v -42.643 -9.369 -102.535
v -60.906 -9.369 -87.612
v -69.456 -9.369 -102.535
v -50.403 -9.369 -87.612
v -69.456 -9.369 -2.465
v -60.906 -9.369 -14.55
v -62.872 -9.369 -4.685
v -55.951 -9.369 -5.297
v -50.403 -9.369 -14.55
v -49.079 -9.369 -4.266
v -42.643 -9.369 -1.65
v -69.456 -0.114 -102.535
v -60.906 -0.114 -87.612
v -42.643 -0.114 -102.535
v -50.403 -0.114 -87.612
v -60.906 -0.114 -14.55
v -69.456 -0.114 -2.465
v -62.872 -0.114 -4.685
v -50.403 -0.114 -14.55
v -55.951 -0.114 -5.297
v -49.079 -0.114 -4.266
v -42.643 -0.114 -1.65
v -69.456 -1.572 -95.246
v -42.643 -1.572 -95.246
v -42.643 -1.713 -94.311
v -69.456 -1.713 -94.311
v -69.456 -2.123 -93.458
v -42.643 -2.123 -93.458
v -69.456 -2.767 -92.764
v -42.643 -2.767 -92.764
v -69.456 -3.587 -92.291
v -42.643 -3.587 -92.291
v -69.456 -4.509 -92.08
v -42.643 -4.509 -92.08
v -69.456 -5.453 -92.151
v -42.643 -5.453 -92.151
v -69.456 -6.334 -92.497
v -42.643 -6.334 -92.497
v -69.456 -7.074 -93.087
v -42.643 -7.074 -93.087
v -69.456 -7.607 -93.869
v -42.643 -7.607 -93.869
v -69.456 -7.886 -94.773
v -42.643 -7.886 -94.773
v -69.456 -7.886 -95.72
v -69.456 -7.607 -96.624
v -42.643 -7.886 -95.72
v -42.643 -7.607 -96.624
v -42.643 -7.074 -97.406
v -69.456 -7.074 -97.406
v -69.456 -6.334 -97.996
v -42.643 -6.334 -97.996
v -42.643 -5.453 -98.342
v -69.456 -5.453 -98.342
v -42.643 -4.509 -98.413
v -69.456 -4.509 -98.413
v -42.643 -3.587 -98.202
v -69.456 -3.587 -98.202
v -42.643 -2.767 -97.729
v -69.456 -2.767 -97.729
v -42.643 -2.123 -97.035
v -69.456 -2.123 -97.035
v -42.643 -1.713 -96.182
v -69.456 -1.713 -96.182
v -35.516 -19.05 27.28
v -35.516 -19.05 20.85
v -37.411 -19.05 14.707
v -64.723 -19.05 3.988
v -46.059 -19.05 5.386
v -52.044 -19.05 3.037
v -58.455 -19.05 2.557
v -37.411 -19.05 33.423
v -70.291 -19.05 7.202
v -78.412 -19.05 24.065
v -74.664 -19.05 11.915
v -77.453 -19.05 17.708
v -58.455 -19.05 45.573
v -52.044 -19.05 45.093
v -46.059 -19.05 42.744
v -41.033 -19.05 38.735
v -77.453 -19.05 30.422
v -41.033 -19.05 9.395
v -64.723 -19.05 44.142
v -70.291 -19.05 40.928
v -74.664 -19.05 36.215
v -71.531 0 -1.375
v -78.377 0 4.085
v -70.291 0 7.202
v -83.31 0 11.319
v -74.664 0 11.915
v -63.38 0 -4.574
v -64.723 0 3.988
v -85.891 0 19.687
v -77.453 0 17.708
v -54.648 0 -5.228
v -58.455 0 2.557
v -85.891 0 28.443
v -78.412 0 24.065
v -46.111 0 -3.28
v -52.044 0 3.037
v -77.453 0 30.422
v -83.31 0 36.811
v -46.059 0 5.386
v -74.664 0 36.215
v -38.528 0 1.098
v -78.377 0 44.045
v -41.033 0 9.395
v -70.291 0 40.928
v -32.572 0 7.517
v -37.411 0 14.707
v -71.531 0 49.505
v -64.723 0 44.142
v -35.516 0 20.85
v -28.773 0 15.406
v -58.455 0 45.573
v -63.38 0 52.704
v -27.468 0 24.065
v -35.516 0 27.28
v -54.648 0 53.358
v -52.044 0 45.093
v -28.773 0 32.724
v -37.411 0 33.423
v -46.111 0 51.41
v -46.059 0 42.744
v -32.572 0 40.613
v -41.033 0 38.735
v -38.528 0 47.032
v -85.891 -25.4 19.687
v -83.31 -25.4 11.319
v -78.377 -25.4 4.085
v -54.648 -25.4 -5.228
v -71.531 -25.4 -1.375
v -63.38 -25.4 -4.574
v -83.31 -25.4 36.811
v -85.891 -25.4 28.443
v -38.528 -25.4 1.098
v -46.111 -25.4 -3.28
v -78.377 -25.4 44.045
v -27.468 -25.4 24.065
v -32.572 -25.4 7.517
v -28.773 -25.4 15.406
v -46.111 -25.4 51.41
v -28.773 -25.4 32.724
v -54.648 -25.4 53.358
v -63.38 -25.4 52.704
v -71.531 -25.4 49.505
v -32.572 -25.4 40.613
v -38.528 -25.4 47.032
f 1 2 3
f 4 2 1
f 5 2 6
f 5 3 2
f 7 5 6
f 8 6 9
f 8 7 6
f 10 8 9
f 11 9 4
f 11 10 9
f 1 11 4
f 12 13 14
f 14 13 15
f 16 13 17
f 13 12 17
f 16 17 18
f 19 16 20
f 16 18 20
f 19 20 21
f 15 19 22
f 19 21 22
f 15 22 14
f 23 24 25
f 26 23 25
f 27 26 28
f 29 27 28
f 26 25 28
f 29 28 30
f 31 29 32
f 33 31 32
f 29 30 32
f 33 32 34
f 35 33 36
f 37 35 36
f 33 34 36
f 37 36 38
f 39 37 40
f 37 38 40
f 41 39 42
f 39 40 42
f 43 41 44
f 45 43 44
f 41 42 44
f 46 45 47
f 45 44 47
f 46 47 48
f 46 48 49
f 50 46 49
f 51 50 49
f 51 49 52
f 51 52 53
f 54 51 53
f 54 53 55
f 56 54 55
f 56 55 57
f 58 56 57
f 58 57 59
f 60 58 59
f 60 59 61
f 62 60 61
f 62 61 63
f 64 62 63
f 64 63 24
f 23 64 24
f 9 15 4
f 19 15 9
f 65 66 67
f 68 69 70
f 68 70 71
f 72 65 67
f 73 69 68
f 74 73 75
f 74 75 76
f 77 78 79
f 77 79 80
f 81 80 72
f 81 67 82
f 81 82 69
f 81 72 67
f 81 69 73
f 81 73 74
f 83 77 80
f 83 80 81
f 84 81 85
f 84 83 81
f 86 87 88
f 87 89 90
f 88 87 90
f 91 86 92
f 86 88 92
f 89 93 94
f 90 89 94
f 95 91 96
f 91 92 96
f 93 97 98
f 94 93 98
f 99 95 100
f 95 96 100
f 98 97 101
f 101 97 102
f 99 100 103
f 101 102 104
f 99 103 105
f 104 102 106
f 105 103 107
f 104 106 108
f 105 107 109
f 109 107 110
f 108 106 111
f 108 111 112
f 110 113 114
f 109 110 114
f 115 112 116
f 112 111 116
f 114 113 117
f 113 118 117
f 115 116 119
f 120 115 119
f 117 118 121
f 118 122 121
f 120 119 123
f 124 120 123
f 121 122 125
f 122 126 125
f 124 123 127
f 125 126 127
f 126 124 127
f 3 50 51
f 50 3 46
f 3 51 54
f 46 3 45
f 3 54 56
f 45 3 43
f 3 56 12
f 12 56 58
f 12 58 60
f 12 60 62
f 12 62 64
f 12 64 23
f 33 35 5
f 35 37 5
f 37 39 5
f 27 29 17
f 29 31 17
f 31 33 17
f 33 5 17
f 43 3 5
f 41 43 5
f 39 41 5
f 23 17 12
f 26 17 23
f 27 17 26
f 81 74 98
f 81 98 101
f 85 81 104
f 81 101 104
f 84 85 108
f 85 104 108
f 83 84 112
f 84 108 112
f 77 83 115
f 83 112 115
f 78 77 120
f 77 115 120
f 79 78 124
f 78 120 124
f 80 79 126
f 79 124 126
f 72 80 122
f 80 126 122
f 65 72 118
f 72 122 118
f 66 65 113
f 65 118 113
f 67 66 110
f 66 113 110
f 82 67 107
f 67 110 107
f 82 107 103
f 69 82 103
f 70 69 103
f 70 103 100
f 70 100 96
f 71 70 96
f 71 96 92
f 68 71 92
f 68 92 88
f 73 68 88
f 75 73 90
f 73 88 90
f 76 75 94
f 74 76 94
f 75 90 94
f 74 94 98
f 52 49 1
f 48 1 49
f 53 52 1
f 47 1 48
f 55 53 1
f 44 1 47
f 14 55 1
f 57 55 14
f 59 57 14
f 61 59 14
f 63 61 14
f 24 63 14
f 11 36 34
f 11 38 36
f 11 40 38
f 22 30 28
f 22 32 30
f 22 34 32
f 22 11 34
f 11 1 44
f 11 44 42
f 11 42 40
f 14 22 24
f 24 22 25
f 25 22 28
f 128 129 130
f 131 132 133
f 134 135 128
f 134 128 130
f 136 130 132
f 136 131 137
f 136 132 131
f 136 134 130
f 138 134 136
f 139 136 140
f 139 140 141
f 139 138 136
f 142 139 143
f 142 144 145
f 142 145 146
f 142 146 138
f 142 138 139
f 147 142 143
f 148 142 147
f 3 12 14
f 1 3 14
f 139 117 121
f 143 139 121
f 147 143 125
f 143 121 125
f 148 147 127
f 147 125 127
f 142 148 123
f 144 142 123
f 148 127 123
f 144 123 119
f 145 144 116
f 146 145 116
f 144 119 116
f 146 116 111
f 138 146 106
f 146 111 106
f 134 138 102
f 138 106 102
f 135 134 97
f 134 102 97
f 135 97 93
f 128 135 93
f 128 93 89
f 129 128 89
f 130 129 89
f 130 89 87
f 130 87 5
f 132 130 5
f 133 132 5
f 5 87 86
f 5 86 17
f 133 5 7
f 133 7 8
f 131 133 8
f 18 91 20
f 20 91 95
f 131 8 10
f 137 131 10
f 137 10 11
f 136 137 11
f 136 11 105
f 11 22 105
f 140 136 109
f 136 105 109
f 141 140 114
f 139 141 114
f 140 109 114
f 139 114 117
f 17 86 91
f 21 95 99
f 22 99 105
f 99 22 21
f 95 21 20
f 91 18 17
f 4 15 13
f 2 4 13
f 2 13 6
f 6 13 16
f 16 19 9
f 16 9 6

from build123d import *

# Parameters (mm, degrees)
F0_R      = 29.3755194238
F0_R_2    = 20.4584720474
F1_DEPTH  = 25.4
F3_W      = 26.813134551
F3_H      = 9.2550148256
F4_DEPTH  = 102.5347784162
F2_R      = 21.5684000446
F5_DEPTH  = 19.05
F7_R      = 3.175
F8_DEPTH  = 50.8
F9_W      = 10.5024166405
F9_H      = 73.061581701
F10_DEPTH = 25.4


with BuildPart() as f1:
    # F0 (on Front) → F1 (new body)
    with BuildSketch(Plane.XZ):
        with Locations((-56.8432807922, 24.0650400519)):
            Circle(F0_R)
        with Locations((-56.8432807922, 24.0650400519)):
            Circle(F0_R_2, mode=Mode.SUBTRACT)
        with Locations((-56.8432807922, 24.0650400519)):
            Circle(F0_R_2)
    extrude(amount=F1_DEPTH)

    # F3 (on Top) → F4 (join)
    with BuildSketch(Plane.XY):
        with Locations((-56.0491830111, -4.7410854604)):
            Rectangle(F3_W, F3_H)
    extrude(amount=-F4_DEPTH)

    # F2 (on face) → F5 (cut)
    with BuildSketch(Plane(origin=(0, 0, 0), x_dir=(-1, 0, 0), z_dir=(0, 1, 0))):
        with Locations((56.8432807922, 24.0650400519)):
            Circle(F2_R)
    extrude(amount=-F5_DEPTH, mode=Mode.SUBTRACT)

    # F7 (on face) → F8 (cut)
    with BuildSketch(Plane.YZ.offset(-42.6426157355)):
        with Locations((-4.7467201948, -95.2464714646)):
            Circle(F7_R)
    extrude(amount=-F8_DEPTH, mode=Mode.SUBTRACT)

    # F9 (on face) → F10 (cut)
    with BuildSketch(Plane(origin=(0, -0.1135780476, 0), x_dir=(-1, 0, 0), z_dir=(0, 1, 0))):
        with Locations((55.6544419378, -51.0808248073)):
            Rectangle(F9_W, F9_H)
    extrude(amount=-F10_DEPTH, mode=Mode.SUBTRACT)


solid = f1.part
